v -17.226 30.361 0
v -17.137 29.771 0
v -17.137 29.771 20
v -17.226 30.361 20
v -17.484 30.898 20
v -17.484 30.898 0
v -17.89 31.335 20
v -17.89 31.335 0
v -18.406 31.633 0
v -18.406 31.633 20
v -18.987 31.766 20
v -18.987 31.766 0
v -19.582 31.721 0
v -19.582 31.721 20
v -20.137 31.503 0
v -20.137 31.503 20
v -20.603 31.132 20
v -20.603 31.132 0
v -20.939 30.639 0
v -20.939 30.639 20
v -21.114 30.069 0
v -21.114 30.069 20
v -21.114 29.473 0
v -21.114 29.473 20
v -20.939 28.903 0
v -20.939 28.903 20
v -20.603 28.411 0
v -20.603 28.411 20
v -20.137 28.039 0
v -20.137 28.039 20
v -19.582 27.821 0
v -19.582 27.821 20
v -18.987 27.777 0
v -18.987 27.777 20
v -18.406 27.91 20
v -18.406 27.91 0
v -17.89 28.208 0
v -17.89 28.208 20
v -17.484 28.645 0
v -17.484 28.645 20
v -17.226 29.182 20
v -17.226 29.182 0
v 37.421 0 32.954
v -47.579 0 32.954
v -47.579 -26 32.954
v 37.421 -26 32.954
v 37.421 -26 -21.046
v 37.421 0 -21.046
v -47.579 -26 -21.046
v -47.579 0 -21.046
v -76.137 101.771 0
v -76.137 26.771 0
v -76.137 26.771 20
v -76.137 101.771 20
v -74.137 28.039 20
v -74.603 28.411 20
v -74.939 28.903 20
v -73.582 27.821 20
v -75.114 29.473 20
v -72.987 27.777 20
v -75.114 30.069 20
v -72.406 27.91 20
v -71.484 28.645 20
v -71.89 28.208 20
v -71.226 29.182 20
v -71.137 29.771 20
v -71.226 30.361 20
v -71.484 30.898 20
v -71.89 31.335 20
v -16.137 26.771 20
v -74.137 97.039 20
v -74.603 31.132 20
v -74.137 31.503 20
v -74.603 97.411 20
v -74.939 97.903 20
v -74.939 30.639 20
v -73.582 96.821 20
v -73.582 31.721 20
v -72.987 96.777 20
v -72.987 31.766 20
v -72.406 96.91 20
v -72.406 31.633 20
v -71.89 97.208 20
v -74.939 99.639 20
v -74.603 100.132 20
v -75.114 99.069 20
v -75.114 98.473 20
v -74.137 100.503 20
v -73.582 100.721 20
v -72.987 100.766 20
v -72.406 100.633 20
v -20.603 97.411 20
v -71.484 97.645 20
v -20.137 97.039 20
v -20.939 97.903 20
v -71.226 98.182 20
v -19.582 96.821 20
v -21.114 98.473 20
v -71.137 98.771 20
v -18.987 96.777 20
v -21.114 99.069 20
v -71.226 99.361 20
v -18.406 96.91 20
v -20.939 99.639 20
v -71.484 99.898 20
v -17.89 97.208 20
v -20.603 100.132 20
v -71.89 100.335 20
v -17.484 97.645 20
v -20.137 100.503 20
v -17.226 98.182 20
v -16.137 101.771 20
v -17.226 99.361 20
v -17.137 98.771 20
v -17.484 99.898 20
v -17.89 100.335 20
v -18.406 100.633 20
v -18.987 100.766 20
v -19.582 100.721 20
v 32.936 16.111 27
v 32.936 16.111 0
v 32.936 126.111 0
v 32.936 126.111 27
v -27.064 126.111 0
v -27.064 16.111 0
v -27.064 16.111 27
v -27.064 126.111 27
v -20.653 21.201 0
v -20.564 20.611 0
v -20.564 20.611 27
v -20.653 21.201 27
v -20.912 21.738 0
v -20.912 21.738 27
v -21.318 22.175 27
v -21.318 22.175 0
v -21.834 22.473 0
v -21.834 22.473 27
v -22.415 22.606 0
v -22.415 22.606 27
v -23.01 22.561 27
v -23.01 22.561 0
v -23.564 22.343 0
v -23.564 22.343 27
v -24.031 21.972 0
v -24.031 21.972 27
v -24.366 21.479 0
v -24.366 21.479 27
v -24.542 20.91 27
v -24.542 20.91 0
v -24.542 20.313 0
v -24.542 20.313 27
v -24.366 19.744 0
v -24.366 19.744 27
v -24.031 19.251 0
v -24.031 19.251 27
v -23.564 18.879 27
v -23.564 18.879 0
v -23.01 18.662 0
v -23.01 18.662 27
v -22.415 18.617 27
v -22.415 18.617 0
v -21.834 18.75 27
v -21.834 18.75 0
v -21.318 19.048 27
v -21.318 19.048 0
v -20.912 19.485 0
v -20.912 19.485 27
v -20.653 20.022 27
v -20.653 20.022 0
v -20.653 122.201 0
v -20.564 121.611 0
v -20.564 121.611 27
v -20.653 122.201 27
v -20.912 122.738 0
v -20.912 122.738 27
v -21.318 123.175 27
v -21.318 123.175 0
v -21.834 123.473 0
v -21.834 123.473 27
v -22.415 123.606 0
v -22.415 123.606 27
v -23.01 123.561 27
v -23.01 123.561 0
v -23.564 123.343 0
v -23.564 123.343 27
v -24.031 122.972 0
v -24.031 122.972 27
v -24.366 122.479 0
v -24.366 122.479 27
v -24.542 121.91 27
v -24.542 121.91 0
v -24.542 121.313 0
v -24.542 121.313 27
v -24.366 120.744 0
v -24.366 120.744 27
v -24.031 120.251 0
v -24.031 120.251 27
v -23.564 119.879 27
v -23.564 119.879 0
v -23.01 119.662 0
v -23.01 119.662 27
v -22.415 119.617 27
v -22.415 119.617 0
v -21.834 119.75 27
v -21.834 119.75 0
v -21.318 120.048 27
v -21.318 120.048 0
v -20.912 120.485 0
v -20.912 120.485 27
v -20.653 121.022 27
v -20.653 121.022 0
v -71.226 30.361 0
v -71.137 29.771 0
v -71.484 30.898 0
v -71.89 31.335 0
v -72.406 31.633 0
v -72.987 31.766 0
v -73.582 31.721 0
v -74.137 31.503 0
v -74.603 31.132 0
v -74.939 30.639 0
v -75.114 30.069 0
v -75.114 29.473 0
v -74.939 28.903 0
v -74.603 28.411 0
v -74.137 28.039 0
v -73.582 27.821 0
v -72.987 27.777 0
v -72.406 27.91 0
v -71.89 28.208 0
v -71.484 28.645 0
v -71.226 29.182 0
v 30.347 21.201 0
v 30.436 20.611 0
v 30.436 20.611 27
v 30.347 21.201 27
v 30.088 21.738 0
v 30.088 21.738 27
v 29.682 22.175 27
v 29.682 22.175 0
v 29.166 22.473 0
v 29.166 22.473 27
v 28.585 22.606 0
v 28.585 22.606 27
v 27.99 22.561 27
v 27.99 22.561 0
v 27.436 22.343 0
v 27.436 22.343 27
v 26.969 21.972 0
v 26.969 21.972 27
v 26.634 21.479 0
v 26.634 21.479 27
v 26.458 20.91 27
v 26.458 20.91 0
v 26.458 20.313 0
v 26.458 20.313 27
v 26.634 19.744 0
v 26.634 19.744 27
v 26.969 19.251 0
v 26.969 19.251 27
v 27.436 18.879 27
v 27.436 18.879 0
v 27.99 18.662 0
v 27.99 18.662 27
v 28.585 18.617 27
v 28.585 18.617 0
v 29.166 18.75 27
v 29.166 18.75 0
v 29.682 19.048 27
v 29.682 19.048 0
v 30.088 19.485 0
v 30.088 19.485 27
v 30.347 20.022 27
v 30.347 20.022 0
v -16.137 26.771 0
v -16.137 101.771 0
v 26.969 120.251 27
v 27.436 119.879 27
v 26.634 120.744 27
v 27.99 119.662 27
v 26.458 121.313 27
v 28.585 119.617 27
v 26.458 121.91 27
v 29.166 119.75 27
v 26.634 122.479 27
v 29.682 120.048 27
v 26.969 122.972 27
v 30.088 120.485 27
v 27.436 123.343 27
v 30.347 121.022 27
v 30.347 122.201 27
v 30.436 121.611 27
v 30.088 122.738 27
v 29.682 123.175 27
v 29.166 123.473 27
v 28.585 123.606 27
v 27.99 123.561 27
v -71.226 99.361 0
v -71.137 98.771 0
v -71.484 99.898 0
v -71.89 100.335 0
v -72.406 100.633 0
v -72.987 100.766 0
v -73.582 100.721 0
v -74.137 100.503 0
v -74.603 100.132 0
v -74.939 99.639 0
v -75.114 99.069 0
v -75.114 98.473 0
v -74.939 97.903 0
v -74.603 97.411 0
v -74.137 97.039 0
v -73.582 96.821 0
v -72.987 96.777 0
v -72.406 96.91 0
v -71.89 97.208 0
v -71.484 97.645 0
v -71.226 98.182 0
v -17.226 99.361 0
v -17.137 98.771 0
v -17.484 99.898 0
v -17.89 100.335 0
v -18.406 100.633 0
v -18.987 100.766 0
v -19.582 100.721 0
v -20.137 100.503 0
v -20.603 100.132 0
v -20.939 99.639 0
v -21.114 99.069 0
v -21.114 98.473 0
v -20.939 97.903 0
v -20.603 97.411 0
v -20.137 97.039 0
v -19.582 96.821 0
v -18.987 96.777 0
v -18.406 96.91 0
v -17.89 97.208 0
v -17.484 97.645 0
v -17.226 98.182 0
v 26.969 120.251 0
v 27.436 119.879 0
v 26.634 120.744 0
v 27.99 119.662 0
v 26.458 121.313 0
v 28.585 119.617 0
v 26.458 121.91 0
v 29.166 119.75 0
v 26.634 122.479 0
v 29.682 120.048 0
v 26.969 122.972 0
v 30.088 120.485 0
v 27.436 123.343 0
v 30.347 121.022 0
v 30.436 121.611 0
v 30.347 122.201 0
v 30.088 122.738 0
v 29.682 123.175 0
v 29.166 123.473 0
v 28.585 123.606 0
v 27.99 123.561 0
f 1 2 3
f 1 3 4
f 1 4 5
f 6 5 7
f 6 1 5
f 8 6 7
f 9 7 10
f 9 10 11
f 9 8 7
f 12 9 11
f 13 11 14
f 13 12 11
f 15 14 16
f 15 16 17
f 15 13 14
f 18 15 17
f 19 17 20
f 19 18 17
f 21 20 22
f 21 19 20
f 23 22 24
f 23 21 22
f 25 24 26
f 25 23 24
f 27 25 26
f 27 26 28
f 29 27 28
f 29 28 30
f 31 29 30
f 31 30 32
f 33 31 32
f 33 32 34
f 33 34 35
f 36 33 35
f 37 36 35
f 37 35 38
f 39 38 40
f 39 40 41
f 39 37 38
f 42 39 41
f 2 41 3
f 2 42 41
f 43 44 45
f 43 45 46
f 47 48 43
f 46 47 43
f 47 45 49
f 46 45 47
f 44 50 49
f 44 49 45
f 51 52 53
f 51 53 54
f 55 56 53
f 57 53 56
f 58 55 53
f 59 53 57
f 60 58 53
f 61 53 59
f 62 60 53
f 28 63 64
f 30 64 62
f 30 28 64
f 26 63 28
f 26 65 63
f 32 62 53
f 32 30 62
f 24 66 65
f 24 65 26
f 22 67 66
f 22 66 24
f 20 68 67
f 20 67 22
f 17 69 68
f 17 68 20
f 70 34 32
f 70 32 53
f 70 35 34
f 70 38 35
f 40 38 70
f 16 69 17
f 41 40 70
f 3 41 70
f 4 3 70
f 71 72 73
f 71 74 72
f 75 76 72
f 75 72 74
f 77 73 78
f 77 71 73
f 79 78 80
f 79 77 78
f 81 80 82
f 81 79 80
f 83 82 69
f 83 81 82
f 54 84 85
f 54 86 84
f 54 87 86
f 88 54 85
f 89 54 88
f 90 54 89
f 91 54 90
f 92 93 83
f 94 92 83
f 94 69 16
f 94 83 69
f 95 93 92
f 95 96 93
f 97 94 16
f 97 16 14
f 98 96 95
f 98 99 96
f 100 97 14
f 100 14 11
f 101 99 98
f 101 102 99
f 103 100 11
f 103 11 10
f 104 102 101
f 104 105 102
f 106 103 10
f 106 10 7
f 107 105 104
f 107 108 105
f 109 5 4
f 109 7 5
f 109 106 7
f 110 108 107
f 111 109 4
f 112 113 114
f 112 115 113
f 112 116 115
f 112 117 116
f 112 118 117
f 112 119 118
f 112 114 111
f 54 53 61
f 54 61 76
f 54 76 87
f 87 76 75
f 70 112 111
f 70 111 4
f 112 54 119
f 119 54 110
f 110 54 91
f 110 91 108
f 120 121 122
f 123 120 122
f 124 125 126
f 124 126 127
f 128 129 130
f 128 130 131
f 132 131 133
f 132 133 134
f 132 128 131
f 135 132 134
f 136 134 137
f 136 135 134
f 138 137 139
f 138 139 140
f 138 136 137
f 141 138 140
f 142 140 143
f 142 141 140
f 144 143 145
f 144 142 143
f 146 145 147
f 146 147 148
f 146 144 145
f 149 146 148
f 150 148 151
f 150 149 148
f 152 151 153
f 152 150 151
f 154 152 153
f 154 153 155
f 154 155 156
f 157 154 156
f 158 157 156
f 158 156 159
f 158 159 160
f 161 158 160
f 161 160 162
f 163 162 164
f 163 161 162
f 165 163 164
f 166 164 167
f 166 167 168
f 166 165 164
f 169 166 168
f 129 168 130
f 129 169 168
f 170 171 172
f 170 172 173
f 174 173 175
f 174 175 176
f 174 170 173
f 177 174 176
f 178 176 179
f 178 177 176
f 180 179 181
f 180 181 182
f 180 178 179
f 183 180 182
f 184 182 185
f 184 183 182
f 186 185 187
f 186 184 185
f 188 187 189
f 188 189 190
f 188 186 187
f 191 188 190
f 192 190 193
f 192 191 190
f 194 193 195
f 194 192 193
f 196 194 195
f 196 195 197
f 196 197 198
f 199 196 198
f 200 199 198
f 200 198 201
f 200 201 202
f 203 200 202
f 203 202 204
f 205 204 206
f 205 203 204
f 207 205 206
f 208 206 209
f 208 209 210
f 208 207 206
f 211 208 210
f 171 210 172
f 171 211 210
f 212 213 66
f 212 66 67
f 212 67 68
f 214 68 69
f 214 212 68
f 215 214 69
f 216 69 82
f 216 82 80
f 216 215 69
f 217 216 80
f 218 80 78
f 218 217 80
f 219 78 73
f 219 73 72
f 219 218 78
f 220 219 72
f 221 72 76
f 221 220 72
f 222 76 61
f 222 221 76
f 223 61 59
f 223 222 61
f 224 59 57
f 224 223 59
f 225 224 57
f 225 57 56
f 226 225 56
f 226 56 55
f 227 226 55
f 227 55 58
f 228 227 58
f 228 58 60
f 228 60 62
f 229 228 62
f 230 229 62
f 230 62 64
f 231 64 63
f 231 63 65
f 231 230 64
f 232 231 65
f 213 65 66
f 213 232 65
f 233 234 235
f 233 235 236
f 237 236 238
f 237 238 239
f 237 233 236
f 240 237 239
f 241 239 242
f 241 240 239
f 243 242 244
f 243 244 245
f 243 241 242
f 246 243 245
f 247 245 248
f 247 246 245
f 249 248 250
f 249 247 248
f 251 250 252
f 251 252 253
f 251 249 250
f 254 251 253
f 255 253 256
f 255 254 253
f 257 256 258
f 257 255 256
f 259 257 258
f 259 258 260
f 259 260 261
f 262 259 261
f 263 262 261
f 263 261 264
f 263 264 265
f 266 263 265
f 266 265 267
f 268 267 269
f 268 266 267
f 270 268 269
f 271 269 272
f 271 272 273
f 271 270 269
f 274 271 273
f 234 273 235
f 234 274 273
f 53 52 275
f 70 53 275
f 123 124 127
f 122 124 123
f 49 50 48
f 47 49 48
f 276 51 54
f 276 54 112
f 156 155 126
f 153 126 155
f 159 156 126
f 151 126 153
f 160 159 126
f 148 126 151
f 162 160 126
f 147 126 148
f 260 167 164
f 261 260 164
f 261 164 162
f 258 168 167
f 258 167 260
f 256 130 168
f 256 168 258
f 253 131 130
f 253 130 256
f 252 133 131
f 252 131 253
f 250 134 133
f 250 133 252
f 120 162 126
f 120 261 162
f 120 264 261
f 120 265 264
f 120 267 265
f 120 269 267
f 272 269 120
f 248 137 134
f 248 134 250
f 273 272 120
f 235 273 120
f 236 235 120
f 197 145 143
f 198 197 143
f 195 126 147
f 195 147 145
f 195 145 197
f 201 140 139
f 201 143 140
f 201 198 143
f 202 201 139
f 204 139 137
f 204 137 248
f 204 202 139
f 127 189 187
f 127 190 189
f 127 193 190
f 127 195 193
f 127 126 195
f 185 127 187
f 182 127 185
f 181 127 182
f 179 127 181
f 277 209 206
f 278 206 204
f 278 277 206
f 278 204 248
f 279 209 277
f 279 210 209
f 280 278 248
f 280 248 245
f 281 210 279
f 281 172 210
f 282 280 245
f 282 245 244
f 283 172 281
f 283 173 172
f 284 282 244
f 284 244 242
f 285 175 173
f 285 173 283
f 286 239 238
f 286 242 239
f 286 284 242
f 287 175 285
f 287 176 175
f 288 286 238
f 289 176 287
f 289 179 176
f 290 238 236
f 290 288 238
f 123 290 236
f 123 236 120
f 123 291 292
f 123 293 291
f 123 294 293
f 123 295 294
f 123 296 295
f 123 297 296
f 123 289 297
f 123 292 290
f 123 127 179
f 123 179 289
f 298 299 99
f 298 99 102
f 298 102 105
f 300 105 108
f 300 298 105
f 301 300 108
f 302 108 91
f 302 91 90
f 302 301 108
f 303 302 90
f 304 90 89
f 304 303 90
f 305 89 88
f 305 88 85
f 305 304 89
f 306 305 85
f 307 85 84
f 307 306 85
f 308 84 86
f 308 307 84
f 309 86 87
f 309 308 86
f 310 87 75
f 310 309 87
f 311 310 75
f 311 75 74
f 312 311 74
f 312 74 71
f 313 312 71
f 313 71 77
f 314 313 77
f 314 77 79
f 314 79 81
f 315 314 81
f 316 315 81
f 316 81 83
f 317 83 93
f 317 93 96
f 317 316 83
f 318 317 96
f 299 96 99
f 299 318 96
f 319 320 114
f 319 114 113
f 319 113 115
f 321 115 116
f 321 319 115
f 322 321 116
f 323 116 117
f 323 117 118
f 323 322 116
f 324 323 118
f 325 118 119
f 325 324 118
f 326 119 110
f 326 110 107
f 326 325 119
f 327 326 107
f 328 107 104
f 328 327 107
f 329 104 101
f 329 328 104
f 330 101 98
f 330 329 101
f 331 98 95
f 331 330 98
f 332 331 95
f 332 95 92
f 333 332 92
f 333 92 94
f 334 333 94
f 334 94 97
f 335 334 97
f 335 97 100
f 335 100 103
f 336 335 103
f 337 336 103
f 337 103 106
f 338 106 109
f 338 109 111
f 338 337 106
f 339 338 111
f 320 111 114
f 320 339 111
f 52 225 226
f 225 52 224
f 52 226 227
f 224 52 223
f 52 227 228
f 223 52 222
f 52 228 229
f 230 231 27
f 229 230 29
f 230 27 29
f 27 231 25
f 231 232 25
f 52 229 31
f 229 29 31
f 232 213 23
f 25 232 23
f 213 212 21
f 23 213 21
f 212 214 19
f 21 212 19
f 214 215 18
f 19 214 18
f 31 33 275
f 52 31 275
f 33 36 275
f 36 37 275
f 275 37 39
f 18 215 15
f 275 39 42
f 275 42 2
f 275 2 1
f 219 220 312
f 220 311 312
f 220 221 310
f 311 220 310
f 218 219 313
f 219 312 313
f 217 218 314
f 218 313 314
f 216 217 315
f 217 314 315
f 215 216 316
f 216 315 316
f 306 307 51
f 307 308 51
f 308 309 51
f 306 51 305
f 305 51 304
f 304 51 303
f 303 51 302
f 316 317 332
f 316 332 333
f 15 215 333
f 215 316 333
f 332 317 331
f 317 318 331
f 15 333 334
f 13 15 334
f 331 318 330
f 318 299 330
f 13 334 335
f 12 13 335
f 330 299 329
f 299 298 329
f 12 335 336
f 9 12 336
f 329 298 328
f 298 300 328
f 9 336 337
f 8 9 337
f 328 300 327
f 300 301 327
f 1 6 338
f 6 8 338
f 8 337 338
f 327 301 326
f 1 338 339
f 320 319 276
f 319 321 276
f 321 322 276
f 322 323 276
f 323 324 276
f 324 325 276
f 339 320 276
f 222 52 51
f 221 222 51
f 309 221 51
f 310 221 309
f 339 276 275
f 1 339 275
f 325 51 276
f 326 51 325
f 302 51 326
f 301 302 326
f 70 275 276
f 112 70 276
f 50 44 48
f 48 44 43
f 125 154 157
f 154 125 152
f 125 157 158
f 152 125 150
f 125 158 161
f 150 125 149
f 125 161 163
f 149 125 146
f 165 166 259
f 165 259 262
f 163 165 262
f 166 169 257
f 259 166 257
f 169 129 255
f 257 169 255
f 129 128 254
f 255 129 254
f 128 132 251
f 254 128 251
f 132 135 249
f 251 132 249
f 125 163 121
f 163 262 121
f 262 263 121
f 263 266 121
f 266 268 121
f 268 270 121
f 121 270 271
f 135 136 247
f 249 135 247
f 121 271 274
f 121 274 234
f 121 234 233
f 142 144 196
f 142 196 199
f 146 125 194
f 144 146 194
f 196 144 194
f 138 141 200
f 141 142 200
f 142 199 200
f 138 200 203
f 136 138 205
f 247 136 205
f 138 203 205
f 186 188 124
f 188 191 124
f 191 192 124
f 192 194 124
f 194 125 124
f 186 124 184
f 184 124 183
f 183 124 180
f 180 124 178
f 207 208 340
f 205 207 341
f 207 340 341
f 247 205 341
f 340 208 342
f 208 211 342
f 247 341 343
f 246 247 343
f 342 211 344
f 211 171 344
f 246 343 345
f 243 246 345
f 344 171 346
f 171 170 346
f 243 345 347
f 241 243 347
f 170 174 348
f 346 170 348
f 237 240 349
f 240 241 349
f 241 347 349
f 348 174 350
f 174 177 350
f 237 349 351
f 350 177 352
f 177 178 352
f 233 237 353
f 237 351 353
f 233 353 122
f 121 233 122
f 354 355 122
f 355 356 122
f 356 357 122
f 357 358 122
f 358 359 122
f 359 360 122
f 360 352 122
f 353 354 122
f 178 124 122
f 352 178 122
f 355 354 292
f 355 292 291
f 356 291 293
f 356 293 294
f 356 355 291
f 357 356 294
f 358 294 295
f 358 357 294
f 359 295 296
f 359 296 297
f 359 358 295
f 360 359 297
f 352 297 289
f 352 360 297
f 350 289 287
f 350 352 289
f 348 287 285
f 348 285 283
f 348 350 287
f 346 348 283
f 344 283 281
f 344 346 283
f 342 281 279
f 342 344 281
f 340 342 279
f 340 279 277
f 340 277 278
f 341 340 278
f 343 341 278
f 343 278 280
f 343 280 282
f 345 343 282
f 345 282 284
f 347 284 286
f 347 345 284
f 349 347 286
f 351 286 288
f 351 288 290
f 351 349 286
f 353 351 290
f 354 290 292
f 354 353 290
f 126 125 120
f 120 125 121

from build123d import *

# Parameters (mm, degrees)
F0_W     = 85
F0_H     = 54
F1_DEPTH = 26
F3_W     = 60
F3_H     = 75
F3_R     = 2
F4_DEPTH = 20
F2_W     = 60
F2_H     = 110
F2_R     = 2
F5_DEPTH = 27


with BuildPart() as f1:
    # F0 (on Front) → F1 (new body)
    with BuildSketch(Plane.XZ):
        with Locations((-5.079324, 5.954182)):
            Rectangle(F0_W, F0_H)
    extrude(amount=F1_DEPTH)


with BuildPart() as f4:
    # F3 (on Top) → F4 (new body)
    with BuildSketch(Plane.XY):
        with Locations((-46.136814, 64.271254)):
            Rectangle(F3_W, F3_H)
        with Locations((-73.136814, 29.771254)):
            Circle(F3_R, mode=Mode.SUBTRACT)
        with Locations((-19.136814, 29.771254)):
            Circle(F3_R, mode=Mode.SUBTRACT)
        with Locations((-73.136814, 98.771254)):
            Circle(F3_R, mode=Mode.SUBTRACT)
        with Locations((-19.136814, 98.771254)):
            Circle(F3_R, mode=Mode.SUBTRACT)
    extrude(amount=F4_DEPTH)


with BuildPart() as f5:
    # F2 (on Top) → F5 (new body)
    with BuildSketch(Plane.XY):
        with Locations((2.935512, 71.111426)):
            Rectangle(F2_W, F2_H)
        with Locations((-22.564488, 20.611426)):
            Circle(F2_R, mode=Mode.SUBTRACT)
        with Locations((28.435512, 20.611426)):
            Circle(F2_R, mode=Mode.SUBTRACT)
        with Locations((-22.564488, 121.611426)):
            Circle(F2_R, mode=Mode.SUBTRACT)
        with Locations((28.435512, 121.611426)):
            Circle(F2_R, mode=Mode.SUBTRACT)
    extrude(amount=F5_DEPTH)


solid = Compound([f1.part, f4.part, f5.part])
